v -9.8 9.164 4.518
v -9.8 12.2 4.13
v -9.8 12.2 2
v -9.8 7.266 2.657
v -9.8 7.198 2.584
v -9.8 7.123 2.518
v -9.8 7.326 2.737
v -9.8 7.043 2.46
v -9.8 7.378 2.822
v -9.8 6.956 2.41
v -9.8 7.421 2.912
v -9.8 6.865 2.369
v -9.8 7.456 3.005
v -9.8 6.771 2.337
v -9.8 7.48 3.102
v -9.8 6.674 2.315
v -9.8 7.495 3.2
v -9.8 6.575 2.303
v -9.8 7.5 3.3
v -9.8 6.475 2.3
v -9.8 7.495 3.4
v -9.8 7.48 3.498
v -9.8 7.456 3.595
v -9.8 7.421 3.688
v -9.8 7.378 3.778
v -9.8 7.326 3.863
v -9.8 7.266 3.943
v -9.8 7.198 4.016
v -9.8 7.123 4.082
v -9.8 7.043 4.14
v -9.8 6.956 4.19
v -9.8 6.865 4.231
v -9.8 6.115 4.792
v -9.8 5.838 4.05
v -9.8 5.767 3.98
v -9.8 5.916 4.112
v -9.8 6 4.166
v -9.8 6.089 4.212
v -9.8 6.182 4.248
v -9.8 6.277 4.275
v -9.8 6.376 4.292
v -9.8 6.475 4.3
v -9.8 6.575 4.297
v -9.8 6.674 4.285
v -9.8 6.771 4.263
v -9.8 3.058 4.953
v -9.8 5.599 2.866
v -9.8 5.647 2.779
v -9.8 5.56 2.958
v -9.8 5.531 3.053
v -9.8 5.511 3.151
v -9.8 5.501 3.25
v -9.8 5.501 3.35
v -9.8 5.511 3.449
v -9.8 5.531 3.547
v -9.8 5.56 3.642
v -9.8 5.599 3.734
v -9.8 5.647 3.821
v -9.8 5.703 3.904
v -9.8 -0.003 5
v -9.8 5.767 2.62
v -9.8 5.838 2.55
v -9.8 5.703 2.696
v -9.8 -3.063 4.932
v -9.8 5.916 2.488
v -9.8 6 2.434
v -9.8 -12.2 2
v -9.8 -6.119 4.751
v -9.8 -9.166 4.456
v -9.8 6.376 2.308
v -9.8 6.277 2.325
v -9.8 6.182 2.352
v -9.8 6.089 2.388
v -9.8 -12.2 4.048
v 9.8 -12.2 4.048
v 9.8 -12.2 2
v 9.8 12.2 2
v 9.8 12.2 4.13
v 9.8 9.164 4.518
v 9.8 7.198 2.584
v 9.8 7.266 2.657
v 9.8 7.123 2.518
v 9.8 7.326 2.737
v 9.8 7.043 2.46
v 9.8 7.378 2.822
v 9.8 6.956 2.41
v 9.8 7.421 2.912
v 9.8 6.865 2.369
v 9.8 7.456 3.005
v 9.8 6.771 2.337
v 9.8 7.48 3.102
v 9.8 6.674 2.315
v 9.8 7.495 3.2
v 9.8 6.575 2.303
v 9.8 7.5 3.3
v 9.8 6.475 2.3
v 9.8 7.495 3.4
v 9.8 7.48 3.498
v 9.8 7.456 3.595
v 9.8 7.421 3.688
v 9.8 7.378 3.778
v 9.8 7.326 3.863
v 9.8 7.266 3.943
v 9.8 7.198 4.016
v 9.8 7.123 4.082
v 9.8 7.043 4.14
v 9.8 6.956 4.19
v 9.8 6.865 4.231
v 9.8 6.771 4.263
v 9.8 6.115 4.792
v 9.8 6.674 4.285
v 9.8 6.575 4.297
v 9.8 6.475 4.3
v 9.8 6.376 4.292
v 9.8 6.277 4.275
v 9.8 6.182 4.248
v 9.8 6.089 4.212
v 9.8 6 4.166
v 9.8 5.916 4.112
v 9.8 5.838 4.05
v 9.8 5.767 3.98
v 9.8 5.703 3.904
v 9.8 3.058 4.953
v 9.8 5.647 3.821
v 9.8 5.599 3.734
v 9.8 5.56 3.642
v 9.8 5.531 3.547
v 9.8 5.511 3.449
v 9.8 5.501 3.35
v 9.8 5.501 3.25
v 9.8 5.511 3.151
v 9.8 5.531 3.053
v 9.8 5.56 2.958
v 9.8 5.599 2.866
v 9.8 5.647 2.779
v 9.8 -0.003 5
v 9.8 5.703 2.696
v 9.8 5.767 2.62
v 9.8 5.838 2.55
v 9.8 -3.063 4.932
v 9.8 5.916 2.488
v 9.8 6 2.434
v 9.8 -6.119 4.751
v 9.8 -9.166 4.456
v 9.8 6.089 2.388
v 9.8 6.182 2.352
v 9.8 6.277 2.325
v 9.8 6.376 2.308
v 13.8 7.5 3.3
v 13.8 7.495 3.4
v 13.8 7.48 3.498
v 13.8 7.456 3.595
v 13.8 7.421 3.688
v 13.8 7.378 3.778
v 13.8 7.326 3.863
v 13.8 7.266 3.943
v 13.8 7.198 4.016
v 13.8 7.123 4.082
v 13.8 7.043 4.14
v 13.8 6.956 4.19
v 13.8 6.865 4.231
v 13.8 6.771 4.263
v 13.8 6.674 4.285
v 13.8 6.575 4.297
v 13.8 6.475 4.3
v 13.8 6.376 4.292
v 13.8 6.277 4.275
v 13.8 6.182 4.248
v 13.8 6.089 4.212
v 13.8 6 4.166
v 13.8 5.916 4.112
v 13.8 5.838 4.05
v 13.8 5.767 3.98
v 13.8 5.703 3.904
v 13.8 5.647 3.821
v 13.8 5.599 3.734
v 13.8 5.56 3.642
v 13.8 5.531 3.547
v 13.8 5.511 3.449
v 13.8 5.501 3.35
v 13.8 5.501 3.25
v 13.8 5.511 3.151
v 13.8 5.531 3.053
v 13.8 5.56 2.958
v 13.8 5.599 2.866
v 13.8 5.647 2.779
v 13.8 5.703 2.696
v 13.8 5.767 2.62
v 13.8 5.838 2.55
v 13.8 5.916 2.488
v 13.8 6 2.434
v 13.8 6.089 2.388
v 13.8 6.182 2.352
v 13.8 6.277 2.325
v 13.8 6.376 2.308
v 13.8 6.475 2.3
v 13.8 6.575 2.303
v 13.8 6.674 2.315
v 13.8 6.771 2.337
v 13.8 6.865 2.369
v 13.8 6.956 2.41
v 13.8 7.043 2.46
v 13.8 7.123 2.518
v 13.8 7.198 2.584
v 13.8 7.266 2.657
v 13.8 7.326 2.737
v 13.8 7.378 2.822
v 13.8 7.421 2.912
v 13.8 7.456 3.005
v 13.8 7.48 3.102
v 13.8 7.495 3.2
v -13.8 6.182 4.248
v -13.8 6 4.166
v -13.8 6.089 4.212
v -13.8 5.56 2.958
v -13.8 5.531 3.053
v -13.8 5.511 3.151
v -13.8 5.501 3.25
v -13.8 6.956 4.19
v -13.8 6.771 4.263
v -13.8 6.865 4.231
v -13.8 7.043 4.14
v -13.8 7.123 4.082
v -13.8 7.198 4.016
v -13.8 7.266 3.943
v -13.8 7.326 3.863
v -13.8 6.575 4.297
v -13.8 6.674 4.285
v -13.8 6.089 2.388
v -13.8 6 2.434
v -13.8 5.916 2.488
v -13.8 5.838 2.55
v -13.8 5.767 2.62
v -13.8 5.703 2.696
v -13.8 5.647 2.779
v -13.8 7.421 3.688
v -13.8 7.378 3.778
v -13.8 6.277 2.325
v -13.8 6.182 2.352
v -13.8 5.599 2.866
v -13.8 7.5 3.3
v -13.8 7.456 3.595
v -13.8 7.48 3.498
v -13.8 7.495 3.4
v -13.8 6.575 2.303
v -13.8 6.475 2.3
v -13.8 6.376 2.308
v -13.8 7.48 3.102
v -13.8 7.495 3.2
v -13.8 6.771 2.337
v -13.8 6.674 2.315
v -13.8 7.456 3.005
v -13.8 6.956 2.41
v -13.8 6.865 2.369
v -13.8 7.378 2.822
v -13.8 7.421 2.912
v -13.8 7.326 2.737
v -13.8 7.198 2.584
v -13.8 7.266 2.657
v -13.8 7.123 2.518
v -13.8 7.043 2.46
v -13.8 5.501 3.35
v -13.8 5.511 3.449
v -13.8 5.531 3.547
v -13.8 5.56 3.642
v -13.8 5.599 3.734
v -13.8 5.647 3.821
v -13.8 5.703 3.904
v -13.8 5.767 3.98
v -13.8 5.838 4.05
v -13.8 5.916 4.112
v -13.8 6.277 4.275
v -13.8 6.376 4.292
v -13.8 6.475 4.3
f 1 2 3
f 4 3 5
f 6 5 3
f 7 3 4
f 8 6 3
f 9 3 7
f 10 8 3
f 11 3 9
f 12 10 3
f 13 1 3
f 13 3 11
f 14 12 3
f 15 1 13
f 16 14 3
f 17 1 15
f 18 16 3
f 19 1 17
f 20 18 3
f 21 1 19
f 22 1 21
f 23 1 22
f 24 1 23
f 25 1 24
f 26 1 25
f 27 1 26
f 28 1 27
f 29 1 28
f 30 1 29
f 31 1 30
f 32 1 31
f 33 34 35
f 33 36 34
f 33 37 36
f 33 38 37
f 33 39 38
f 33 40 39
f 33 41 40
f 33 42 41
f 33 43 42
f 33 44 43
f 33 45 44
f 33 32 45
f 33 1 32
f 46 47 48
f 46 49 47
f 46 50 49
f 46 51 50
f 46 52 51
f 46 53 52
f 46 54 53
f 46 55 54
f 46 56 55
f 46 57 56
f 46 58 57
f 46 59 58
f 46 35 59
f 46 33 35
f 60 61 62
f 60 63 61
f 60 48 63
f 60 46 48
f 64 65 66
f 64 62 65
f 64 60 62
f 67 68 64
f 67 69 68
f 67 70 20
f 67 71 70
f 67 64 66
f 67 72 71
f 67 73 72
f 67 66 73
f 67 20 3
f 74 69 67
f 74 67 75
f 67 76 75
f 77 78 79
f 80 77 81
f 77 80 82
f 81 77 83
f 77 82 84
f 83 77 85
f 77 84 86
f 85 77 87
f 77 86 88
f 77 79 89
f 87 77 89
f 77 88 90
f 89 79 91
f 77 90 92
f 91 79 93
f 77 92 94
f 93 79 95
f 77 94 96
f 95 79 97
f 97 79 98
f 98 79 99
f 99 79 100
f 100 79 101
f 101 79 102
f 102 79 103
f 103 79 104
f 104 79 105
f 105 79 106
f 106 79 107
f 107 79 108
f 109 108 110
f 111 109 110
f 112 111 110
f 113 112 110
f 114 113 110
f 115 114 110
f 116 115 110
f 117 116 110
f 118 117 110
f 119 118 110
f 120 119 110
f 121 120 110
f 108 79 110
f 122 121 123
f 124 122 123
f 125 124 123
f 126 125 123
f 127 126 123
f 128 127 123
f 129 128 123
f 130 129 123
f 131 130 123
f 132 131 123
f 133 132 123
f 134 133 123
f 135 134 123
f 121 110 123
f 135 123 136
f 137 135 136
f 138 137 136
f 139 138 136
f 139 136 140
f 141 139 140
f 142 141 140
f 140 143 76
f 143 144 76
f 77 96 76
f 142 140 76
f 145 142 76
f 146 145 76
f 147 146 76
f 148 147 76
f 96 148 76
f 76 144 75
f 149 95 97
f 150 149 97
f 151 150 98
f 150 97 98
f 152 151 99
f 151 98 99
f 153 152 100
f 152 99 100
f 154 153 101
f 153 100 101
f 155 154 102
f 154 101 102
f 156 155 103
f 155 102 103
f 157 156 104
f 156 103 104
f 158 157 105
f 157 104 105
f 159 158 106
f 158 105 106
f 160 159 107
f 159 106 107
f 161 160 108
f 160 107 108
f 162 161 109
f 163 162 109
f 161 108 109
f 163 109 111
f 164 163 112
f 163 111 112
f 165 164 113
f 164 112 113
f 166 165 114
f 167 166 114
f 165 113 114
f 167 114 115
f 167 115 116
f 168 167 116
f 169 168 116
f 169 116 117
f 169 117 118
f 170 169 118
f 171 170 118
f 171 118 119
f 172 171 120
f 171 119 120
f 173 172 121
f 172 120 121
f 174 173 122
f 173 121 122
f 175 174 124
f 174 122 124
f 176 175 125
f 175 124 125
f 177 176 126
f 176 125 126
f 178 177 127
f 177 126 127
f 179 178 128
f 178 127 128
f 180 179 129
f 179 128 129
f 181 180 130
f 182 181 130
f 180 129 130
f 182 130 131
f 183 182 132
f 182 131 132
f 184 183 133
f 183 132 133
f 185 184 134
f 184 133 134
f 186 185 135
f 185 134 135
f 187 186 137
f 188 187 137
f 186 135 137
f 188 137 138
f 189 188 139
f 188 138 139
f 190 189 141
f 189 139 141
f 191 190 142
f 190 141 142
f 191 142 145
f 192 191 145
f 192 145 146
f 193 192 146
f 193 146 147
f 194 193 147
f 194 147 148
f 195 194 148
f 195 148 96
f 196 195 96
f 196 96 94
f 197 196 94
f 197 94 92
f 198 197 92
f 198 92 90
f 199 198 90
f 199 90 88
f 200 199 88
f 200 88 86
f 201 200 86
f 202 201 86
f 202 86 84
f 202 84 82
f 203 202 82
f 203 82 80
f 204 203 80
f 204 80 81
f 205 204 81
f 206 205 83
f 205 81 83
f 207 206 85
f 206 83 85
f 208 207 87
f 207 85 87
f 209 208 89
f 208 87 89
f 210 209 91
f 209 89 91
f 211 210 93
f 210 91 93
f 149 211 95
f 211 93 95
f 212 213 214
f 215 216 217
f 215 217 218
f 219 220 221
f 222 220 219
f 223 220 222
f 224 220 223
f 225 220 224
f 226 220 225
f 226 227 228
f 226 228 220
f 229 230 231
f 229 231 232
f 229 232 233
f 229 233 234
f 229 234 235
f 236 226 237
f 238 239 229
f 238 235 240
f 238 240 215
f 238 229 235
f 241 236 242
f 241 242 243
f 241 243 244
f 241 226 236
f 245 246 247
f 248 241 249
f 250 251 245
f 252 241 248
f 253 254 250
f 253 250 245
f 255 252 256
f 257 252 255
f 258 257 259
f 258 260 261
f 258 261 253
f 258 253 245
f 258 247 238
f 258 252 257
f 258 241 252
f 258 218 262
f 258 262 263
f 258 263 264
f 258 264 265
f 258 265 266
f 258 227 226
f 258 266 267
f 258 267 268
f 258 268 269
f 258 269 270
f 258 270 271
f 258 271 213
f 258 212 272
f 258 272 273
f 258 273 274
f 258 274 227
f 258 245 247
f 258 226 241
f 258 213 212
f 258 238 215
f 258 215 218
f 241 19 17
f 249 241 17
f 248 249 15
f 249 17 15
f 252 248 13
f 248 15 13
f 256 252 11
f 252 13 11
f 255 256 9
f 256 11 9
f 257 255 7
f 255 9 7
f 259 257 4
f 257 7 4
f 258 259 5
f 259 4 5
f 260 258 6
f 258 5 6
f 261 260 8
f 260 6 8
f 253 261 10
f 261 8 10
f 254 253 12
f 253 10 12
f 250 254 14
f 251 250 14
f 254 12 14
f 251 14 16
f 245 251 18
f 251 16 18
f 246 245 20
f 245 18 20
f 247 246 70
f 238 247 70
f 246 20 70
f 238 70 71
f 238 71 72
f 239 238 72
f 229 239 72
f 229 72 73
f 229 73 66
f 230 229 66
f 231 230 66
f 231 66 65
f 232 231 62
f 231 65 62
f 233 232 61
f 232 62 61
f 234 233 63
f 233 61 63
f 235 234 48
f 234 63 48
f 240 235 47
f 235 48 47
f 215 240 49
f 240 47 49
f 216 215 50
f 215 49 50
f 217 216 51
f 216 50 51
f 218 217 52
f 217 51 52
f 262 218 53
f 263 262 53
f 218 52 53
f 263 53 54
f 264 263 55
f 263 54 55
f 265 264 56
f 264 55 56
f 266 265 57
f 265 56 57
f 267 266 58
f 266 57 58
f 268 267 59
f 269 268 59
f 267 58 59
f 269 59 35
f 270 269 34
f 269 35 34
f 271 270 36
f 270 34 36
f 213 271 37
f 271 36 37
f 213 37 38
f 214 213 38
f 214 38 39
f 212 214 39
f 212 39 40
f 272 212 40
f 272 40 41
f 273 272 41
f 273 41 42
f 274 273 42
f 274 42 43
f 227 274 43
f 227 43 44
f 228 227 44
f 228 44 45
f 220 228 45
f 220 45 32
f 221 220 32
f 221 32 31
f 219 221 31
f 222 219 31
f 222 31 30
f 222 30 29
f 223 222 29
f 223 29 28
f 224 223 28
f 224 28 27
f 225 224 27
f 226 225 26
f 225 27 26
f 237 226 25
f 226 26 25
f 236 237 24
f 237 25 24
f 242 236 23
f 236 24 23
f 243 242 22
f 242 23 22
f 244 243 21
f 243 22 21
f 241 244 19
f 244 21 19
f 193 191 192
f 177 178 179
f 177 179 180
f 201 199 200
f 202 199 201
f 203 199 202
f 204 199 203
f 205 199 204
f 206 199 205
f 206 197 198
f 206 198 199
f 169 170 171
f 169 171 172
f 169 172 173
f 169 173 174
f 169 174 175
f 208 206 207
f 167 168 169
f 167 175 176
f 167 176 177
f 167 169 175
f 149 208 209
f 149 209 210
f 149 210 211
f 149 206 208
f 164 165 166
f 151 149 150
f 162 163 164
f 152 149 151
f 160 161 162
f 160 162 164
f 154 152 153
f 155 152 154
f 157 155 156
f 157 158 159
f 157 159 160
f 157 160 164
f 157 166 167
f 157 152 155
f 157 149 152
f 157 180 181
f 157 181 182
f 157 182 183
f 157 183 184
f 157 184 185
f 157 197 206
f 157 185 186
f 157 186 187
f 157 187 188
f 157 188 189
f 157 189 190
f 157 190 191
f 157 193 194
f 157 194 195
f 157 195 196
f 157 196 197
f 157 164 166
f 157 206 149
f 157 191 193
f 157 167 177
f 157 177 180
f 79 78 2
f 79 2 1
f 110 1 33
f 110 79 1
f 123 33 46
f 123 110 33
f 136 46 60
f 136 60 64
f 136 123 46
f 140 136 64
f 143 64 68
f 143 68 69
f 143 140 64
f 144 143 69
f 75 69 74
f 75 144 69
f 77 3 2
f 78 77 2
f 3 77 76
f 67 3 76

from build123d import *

# Parameters (mm, degrees)
PAD002_DEPTH = 9.8
SKETCH008_R  = 1
PAD003_DEPTH = 4
SKETCH009_R  = 1
PAD004_DEPTH = 4


with BuildPart() as part:
    # Sketch006 → Pad002 (new body, symmetric)
    with BuildSketch(Plane.YZ):
        with BuildLine():
            Line((12.2, 2), (-12.2, 2))
            Line((-12.2, 2), (-12.2, 4.047819))
            ThreePointArc((12.2, 4.12971), (-0.003057, 4.999537), (-12.2, 4.047819))
            Line((12.2, 2), (12.2, 4.12971))
        make_face()
    extrude(amount=PAD002_DEPTH, both=True)

    # Sketch008 → Pad003 (new body)
    with BuildSketch(Plane.YZ.offset(9.8)):
        with Locations((6.5, 3.3)):
            Circle(SKETCH008_R)
    extrude(amount=PAD003_DEPTH)

    # Sketch009 → Pad004 (new body)
    with BuildSketch(Plane(origin=(-9.8, 0, 0), x_dir=(0, 1, 0), z_dir=(-1, 0, 0))):
        with Locations((6.5, -3.3)):
            Circle(SKETCH009_R)
    extrude(amount=PAD004_DEPTH)


solid = part.part
